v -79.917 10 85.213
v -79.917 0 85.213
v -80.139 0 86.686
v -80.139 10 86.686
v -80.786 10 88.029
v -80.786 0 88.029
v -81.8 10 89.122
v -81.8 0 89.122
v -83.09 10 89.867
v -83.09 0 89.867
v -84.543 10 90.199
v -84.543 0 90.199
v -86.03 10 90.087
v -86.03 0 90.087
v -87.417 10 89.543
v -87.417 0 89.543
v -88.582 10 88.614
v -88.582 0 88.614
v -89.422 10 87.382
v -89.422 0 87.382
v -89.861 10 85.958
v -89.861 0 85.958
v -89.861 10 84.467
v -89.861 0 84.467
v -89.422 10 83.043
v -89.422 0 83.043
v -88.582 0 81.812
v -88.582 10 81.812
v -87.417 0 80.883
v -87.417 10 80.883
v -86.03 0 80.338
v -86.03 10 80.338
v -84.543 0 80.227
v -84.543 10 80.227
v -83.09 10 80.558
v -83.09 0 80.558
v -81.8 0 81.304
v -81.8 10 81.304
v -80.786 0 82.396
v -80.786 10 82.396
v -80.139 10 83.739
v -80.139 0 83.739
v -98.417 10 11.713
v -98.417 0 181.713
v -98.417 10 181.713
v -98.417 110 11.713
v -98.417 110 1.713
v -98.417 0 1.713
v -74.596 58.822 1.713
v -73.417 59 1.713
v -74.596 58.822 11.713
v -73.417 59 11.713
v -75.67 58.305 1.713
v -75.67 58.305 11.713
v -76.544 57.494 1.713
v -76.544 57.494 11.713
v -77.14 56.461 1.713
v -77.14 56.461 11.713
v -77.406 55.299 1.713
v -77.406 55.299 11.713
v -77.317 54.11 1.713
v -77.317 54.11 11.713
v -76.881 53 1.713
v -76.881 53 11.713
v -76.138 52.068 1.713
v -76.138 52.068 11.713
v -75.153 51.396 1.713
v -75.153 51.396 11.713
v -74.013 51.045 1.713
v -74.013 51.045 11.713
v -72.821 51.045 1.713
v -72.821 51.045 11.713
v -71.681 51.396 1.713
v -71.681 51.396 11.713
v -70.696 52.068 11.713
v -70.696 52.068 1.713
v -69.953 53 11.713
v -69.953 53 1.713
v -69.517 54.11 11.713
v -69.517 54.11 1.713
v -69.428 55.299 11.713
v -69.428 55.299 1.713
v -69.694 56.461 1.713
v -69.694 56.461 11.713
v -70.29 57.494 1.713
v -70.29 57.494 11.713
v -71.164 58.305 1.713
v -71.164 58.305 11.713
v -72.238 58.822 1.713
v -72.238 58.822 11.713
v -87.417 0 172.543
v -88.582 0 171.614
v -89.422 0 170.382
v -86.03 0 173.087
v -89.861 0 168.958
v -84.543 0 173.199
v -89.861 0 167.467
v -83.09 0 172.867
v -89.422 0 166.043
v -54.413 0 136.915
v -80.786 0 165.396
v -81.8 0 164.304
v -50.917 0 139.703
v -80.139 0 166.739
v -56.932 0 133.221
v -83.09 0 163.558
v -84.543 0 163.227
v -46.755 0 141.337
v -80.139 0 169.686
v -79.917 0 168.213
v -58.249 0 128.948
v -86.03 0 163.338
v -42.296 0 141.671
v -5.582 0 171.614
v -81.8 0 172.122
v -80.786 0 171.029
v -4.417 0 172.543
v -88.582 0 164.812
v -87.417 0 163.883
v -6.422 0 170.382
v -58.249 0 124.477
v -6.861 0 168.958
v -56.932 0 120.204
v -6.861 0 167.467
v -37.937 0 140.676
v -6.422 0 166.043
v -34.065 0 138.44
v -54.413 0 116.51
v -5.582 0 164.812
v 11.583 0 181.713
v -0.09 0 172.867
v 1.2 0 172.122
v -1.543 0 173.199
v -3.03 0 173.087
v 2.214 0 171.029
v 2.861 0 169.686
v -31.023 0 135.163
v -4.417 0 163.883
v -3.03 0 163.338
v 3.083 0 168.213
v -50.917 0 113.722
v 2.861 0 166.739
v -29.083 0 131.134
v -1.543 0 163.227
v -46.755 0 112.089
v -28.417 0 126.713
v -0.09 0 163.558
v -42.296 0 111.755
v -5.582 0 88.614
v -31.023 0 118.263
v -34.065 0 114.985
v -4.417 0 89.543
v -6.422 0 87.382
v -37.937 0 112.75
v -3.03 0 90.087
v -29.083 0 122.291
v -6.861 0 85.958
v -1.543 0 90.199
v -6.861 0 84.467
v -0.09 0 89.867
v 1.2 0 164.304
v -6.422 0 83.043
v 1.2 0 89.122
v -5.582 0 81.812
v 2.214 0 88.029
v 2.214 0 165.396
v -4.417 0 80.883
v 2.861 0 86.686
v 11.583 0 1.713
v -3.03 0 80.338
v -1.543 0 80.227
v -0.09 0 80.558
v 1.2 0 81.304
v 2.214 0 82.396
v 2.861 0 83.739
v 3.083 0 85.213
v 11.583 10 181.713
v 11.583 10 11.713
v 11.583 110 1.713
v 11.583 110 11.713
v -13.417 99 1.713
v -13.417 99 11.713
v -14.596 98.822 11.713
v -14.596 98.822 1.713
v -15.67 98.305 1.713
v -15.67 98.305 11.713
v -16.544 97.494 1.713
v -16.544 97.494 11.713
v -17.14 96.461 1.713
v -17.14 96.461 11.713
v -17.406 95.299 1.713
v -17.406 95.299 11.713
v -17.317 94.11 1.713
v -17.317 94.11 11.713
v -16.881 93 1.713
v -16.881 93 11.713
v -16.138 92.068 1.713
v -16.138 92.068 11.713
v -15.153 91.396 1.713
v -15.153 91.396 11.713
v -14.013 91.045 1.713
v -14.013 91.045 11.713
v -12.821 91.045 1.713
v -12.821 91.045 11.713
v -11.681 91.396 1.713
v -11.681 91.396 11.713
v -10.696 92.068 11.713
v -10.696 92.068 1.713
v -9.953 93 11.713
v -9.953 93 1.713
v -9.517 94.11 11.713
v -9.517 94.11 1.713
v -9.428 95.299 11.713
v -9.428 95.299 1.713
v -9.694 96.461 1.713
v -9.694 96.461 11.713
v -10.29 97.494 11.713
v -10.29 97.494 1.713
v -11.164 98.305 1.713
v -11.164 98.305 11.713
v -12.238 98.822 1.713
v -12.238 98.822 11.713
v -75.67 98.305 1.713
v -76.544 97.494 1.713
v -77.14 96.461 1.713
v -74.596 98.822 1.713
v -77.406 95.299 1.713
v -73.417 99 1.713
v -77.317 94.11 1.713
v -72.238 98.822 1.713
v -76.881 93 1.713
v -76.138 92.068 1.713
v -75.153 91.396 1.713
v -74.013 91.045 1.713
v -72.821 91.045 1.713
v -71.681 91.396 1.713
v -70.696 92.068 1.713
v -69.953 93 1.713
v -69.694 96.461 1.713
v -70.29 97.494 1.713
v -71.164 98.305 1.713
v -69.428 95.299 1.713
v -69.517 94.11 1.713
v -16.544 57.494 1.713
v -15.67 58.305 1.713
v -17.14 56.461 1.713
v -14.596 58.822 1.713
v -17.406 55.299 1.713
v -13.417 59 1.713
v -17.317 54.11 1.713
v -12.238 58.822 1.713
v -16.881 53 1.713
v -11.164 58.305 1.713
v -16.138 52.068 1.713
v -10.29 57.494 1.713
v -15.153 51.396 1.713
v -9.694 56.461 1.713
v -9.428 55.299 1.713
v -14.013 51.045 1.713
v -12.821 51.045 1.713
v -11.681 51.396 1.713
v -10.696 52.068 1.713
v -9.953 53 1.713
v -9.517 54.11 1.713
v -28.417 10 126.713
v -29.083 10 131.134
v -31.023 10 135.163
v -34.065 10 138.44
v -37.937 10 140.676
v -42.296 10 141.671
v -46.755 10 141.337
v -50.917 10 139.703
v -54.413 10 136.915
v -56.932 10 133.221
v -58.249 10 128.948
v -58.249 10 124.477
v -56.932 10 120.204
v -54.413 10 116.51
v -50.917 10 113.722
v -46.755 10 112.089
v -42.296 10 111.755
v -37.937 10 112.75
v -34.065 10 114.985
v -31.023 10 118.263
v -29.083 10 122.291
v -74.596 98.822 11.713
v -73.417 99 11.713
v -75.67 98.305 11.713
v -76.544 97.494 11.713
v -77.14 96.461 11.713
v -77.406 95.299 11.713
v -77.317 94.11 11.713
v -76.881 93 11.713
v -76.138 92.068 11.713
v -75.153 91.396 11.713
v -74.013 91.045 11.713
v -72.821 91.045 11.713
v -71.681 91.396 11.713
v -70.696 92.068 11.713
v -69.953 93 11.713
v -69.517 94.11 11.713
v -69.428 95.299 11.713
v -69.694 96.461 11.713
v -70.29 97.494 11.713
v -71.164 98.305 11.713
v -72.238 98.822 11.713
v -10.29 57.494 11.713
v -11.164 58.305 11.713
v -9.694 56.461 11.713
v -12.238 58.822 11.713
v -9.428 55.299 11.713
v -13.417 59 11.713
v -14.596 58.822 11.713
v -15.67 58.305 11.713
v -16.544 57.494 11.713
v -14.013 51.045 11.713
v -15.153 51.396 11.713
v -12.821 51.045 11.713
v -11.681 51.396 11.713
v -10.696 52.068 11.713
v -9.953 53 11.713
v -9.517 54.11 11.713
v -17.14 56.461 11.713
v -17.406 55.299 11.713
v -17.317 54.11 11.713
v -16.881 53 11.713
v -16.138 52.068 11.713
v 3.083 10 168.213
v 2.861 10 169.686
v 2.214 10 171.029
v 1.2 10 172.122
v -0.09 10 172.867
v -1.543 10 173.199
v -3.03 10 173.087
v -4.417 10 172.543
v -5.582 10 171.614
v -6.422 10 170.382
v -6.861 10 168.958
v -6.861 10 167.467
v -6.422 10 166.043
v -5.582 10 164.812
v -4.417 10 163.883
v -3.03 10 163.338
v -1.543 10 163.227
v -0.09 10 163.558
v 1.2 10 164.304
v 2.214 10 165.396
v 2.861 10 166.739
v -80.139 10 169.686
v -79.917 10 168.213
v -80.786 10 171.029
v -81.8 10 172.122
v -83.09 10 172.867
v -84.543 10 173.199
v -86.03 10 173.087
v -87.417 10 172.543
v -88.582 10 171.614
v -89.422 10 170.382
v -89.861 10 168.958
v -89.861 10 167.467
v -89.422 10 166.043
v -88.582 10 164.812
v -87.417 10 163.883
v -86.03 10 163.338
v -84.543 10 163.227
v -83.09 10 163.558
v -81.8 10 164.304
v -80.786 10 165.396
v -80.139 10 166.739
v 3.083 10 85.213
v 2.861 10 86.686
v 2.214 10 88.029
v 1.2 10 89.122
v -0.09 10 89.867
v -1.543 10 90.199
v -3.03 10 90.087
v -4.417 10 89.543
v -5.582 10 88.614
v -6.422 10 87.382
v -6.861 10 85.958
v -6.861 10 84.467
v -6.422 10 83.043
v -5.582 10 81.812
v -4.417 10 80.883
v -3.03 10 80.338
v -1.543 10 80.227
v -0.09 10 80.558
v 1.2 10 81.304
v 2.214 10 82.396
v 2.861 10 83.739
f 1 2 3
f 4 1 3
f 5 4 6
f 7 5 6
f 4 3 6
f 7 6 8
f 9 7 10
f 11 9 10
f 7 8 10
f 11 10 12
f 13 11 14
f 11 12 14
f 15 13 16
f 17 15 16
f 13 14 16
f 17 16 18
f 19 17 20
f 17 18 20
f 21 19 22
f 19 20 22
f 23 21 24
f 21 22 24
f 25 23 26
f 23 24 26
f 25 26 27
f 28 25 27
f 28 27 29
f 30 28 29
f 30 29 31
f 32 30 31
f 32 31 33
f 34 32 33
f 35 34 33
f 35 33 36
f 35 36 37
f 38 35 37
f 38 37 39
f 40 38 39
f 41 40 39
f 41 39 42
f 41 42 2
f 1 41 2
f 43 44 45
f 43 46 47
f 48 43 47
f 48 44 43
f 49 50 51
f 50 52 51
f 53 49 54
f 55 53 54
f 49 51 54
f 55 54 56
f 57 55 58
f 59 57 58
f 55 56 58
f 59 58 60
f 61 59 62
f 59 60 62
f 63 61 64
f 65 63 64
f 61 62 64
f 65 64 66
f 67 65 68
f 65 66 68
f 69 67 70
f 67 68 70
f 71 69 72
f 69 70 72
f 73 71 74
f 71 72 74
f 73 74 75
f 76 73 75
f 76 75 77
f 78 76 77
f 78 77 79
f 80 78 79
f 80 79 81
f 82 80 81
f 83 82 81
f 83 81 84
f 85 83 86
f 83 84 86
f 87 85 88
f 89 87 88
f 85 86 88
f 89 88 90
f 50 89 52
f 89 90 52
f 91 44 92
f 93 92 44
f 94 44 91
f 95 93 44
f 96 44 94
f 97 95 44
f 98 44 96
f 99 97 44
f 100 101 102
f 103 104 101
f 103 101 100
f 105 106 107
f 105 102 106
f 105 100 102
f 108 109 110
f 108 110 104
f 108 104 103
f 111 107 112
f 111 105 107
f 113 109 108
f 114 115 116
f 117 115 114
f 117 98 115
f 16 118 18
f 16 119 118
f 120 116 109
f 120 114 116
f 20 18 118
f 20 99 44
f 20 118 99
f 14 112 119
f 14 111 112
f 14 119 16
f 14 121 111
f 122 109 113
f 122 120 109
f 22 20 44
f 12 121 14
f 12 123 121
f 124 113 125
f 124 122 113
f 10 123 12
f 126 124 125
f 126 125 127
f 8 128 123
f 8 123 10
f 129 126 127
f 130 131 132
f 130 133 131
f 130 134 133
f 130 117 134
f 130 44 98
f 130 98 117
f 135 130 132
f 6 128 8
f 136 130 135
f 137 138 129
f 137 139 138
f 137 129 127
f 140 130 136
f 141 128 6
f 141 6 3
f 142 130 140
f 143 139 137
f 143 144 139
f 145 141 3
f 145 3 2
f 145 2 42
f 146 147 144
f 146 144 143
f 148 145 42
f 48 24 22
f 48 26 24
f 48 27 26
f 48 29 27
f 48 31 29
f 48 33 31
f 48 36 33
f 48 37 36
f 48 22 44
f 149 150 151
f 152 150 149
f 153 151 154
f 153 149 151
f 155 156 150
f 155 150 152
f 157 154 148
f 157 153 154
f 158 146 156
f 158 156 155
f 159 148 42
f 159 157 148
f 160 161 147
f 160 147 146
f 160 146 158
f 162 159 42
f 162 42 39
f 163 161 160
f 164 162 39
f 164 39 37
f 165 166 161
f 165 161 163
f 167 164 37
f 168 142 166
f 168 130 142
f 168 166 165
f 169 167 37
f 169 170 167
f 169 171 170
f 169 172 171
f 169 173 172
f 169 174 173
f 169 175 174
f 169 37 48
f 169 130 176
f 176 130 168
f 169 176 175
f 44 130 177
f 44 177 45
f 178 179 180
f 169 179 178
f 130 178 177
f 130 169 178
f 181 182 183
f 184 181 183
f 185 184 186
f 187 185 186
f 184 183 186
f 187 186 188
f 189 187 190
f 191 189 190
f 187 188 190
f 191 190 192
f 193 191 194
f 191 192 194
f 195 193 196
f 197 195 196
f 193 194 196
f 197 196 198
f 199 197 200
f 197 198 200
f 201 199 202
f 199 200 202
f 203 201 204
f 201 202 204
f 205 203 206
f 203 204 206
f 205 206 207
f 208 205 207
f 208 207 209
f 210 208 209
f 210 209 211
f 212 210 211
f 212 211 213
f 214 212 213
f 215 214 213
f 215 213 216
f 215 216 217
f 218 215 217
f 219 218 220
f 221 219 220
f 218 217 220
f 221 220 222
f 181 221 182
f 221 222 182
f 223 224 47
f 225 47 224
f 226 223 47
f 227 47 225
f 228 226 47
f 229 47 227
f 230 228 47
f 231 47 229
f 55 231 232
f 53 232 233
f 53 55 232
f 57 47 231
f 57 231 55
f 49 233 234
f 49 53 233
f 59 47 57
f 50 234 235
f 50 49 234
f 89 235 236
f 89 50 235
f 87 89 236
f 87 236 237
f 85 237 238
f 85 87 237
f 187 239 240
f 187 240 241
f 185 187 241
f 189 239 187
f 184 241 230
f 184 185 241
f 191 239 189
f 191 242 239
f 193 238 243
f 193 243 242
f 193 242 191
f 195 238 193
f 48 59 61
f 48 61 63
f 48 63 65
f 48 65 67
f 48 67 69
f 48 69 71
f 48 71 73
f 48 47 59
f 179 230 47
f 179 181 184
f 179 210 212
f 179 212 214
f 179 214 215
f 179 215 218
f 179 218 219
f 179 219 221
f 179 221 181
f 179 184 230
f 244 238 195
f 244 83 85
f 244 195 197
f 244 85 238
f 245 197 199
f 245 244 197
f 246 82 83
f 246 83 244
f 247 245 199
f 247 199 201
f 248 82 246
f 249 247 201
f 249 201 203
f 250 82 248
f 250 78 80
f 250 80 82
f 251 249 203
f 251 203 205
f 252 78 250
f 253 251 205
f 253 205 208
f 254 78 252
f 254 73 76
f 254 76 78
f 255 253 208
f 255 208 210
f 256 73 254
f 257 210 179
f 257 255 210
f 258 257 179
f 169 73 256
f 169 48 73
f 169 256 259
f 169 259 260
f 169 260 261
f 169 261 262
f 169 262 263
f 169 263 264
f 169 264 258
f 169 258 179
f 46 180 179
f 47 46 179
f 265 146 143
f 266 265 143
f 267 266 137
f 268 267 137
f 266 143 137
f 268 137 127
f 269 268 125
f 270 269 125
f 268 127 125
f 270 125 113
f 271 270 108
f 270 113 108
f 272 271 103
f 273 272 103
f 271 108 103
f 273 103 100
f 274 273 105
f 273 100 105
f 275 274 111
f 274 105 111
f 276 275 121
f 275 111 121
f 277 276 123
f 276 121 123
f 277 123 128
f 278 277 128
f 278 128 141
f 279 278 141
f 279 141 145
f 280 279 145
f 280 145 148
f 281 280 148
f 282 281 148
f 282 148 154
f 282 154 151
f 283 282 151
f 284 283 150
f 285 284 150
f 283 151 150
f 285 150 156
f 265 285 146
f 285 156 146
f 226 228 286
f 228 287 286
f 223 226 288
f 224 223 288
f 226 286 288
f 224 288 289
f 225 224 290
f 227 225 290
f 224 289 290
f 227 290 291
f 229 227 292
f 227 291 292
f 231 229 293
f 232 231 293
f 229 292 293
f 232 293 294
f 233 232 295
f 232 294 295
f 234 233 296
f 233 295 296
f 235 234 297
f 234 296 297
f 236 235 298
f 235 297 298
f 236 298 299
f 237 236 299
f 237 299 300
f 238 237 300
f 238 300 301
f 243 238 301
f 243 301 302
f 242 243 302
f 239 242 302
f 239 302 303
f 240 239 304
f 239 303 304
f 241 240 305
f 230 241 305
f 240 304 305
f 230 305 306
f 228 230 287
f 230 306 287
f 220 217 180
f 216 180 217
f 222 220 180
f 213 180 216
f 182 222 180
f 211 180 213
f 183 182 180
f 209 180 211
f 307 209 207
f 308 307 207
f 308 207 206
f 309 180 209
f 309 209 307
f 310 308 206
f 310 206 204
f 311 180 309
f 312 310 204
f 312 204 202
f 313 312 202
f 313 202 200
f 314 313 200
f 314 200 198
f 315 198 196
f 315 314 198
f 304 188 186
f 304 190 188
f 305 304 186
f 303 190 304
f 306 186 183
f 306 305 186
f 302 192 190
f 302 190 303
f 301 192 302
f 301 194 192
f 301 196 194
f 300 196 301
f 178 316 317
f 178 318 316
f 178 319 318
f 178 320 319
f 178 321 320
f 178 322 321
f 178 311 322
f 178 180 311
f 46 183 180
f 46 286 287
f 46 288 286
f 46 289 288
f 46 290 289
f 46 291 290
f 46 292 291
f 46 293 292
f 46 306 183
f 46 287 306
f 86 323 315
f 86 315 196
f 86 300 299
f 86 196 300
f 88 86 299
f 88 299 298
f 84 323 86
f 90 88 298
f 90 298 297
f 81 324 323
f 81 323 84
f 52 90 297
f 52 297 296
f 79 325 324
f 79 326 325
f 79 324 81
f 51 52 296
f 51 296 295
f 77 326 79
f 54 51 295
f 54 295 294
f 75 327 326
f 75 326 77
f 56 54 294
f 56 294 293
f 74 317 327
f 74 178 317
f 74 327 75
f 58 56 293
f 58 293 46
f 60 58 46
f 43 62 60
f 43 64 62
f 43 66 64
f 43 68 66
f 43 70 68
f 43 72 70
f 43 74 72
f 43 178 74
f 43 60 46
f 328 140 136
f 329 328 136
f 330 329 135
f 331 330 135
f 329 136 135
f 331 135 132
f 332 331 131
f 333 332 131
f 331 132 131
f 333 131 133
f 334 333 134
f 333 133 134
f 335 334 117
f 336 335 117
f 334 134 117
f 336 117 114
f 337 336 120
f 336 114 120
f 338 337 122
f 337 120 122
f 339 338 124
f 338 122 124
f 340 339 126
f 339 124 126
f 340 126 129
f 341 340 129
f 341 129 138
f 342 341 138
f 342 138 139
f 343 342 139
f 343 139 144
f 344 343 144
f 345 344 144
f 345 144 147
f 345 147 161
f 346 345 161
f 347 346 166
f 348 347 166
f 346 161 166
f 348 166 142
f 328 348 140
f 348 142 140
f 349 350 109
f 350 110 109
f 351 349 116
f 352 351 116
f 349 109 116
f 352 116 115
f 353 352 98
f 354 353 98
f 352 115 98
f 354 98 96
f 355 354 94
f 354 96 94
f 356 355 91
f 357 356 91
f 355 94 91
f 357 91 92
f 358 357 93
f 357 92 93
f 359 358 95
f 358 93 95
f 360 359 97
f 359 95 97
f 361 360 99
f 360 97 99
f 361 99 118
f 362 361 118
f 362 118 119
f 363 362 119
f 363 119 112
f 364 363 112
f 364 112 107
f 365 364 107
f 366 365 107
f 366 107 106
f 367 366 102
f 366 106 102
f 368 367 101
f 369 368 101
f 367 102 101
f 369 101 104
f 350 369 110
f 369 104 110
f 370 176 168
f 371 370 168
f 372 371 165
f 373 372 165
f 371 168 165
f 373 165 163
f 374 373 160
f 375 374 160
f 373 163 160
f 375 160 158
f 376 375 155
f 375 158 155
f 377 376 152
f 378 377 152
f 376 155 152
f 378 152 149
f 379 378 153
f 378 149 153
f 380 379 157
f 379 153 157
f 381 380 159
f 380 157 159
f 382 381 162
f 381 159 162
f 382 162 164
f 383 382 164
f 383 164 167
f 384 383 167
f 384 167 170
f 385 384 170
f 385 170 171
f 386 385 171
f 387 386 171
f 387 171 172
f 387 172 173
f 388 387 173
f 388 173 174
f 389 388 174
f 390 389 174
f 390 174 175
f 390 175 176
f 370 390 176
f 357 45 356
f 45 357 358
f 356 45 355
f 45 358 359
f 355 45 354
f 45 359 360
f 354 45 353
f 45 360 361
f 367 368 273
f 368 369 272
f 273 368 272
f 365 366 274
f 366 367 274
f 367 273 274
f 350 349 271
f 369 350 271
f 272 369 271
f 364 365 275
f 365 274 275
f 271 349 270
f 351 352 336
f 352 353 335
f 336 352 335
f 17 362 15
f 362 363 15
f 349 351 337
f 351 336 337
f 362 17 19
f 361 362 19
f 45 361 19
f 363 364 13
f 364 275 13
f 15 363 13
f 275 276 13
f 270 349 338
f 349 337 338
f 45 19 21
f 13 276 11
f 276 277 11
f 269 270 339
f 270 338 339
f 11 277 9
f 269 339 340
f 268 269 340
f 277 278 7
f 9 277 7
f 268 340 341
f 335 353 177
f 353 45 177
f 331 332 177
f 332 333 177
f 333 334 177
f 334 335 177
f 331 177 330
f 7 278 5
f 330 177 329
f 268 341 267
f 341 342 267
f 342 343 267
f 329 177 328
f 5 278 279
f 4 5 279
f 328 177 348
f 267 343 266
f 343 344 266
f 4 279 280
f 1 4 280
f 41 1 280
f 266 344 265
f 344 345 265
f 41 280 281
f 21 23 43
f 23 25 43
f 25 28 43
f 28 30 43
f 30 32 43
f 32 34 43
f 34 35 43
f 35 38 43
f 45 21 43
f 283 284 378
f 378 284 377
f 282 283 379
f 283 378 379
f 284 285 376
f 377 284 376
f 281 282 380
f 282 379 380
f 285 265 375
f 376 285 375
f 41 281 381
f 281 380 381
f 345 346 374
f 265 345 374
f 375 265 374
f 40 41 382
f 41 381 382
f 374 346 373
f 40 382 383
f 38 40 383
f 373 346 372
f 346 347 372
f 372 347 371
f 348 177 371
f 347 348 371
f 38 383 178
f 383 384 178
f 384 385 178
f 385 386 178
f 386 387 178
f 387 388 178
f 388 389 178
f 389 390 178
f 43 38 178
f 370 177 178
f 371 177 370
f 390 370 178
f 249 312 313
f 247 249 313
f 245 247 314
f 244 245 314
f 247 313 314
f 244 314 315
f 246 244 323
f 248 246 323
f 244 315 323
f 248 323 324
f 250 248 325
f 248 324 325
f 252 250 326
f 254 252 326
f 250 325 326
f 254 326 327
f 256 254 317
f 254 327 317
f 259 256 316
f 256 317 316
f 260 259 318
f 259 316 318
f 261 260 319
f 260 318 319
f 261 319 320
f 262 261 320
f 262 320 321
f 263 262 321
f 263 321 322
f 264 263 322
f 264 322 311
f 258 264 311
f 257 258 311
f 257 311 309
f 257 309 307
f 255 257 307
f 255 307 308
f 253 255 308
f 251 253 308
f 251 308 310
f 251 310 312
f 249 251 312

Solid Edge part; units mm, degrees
sketch "Sketch1" plane through (0, 0, 0) normal (0, -1, 0) x (1, 0, 0)
  line L0 (-98.417, 1.7127) -> (11.583, 1.7127)
  line L1 (11.583, 1.7127) -> (11.583, 181.7127)
  line L2 (11.583, 181.7127) -> (-98.417, 181.7127)
  line L3 (-98.417, 181.7127) -> (-98.417, 1.7127)
  dimension "D1" = 110
  dimension "D2" = 180
extrude "Protrusion1" add sketch "Sketch1" against normal blind 10
sketch "Sketch2" plane through (-48.417, 0, 81.7127) normal (0, -1, 0) x (1, 0, 0)
  circle A0 centre (-36.5, 86.5) radius 5
  circle A1 centre (46.5, 86.5) radius 5
  circle A2 centre (-36.5, 3.5) radius 5
  circle A3 centre (46.5, 3.5) radius 5
  circle A4 centre (5, 45) radius 15
  dimension "D1" = 125
  dimension "D2" = 10
  dimension "D3" = 10
  dimension "D4" = 10
  dimension "D5" = 83
  dimension "D6" = 83
  dimension "D7" = 41.5
  dimension "D8" = 41.5
extrude "Cutout1" cut sketch "Sketch2" against normal through all
extrude "Cutout2" [suppressed]
sketch "Sketch3" plane through (-43.417, 10, 91.7127) normal (0, 1, 0) x (1, 0, 0)
  line L0 (-55, 90) -> (55, 90)
  line L1 (55, 90) -> (55, 80)
  line L2 (55, 80) -> (-55, 80)
  line L3 (-55, 80) -> (-55, 90)
  dimension "D1" = 10
extrude "Protrusion2" add sketch "Sketch3" along normal blind 100
sketch "Sketch4" plane through (-43.417, 60, 11.7127) normal (0, 0, 1) x (0, 1, 0)
  circle A0 centre (35, 30) radius 4
  circle A1 centre (-5, -30) radius 4
  circle A2 centre (35, -30) radius 4
  circle A3 centre (-5, 30) radius 4
  dimension "D1" = 8
  dimension "D2" = 8
  dimension "D3" = 40
  dimension "D4" = 60
  dimension "D5" = 30
  dimension "D6" = 15
extrude "Cutout3" cut sketch "Sketch4" against normal up to next
